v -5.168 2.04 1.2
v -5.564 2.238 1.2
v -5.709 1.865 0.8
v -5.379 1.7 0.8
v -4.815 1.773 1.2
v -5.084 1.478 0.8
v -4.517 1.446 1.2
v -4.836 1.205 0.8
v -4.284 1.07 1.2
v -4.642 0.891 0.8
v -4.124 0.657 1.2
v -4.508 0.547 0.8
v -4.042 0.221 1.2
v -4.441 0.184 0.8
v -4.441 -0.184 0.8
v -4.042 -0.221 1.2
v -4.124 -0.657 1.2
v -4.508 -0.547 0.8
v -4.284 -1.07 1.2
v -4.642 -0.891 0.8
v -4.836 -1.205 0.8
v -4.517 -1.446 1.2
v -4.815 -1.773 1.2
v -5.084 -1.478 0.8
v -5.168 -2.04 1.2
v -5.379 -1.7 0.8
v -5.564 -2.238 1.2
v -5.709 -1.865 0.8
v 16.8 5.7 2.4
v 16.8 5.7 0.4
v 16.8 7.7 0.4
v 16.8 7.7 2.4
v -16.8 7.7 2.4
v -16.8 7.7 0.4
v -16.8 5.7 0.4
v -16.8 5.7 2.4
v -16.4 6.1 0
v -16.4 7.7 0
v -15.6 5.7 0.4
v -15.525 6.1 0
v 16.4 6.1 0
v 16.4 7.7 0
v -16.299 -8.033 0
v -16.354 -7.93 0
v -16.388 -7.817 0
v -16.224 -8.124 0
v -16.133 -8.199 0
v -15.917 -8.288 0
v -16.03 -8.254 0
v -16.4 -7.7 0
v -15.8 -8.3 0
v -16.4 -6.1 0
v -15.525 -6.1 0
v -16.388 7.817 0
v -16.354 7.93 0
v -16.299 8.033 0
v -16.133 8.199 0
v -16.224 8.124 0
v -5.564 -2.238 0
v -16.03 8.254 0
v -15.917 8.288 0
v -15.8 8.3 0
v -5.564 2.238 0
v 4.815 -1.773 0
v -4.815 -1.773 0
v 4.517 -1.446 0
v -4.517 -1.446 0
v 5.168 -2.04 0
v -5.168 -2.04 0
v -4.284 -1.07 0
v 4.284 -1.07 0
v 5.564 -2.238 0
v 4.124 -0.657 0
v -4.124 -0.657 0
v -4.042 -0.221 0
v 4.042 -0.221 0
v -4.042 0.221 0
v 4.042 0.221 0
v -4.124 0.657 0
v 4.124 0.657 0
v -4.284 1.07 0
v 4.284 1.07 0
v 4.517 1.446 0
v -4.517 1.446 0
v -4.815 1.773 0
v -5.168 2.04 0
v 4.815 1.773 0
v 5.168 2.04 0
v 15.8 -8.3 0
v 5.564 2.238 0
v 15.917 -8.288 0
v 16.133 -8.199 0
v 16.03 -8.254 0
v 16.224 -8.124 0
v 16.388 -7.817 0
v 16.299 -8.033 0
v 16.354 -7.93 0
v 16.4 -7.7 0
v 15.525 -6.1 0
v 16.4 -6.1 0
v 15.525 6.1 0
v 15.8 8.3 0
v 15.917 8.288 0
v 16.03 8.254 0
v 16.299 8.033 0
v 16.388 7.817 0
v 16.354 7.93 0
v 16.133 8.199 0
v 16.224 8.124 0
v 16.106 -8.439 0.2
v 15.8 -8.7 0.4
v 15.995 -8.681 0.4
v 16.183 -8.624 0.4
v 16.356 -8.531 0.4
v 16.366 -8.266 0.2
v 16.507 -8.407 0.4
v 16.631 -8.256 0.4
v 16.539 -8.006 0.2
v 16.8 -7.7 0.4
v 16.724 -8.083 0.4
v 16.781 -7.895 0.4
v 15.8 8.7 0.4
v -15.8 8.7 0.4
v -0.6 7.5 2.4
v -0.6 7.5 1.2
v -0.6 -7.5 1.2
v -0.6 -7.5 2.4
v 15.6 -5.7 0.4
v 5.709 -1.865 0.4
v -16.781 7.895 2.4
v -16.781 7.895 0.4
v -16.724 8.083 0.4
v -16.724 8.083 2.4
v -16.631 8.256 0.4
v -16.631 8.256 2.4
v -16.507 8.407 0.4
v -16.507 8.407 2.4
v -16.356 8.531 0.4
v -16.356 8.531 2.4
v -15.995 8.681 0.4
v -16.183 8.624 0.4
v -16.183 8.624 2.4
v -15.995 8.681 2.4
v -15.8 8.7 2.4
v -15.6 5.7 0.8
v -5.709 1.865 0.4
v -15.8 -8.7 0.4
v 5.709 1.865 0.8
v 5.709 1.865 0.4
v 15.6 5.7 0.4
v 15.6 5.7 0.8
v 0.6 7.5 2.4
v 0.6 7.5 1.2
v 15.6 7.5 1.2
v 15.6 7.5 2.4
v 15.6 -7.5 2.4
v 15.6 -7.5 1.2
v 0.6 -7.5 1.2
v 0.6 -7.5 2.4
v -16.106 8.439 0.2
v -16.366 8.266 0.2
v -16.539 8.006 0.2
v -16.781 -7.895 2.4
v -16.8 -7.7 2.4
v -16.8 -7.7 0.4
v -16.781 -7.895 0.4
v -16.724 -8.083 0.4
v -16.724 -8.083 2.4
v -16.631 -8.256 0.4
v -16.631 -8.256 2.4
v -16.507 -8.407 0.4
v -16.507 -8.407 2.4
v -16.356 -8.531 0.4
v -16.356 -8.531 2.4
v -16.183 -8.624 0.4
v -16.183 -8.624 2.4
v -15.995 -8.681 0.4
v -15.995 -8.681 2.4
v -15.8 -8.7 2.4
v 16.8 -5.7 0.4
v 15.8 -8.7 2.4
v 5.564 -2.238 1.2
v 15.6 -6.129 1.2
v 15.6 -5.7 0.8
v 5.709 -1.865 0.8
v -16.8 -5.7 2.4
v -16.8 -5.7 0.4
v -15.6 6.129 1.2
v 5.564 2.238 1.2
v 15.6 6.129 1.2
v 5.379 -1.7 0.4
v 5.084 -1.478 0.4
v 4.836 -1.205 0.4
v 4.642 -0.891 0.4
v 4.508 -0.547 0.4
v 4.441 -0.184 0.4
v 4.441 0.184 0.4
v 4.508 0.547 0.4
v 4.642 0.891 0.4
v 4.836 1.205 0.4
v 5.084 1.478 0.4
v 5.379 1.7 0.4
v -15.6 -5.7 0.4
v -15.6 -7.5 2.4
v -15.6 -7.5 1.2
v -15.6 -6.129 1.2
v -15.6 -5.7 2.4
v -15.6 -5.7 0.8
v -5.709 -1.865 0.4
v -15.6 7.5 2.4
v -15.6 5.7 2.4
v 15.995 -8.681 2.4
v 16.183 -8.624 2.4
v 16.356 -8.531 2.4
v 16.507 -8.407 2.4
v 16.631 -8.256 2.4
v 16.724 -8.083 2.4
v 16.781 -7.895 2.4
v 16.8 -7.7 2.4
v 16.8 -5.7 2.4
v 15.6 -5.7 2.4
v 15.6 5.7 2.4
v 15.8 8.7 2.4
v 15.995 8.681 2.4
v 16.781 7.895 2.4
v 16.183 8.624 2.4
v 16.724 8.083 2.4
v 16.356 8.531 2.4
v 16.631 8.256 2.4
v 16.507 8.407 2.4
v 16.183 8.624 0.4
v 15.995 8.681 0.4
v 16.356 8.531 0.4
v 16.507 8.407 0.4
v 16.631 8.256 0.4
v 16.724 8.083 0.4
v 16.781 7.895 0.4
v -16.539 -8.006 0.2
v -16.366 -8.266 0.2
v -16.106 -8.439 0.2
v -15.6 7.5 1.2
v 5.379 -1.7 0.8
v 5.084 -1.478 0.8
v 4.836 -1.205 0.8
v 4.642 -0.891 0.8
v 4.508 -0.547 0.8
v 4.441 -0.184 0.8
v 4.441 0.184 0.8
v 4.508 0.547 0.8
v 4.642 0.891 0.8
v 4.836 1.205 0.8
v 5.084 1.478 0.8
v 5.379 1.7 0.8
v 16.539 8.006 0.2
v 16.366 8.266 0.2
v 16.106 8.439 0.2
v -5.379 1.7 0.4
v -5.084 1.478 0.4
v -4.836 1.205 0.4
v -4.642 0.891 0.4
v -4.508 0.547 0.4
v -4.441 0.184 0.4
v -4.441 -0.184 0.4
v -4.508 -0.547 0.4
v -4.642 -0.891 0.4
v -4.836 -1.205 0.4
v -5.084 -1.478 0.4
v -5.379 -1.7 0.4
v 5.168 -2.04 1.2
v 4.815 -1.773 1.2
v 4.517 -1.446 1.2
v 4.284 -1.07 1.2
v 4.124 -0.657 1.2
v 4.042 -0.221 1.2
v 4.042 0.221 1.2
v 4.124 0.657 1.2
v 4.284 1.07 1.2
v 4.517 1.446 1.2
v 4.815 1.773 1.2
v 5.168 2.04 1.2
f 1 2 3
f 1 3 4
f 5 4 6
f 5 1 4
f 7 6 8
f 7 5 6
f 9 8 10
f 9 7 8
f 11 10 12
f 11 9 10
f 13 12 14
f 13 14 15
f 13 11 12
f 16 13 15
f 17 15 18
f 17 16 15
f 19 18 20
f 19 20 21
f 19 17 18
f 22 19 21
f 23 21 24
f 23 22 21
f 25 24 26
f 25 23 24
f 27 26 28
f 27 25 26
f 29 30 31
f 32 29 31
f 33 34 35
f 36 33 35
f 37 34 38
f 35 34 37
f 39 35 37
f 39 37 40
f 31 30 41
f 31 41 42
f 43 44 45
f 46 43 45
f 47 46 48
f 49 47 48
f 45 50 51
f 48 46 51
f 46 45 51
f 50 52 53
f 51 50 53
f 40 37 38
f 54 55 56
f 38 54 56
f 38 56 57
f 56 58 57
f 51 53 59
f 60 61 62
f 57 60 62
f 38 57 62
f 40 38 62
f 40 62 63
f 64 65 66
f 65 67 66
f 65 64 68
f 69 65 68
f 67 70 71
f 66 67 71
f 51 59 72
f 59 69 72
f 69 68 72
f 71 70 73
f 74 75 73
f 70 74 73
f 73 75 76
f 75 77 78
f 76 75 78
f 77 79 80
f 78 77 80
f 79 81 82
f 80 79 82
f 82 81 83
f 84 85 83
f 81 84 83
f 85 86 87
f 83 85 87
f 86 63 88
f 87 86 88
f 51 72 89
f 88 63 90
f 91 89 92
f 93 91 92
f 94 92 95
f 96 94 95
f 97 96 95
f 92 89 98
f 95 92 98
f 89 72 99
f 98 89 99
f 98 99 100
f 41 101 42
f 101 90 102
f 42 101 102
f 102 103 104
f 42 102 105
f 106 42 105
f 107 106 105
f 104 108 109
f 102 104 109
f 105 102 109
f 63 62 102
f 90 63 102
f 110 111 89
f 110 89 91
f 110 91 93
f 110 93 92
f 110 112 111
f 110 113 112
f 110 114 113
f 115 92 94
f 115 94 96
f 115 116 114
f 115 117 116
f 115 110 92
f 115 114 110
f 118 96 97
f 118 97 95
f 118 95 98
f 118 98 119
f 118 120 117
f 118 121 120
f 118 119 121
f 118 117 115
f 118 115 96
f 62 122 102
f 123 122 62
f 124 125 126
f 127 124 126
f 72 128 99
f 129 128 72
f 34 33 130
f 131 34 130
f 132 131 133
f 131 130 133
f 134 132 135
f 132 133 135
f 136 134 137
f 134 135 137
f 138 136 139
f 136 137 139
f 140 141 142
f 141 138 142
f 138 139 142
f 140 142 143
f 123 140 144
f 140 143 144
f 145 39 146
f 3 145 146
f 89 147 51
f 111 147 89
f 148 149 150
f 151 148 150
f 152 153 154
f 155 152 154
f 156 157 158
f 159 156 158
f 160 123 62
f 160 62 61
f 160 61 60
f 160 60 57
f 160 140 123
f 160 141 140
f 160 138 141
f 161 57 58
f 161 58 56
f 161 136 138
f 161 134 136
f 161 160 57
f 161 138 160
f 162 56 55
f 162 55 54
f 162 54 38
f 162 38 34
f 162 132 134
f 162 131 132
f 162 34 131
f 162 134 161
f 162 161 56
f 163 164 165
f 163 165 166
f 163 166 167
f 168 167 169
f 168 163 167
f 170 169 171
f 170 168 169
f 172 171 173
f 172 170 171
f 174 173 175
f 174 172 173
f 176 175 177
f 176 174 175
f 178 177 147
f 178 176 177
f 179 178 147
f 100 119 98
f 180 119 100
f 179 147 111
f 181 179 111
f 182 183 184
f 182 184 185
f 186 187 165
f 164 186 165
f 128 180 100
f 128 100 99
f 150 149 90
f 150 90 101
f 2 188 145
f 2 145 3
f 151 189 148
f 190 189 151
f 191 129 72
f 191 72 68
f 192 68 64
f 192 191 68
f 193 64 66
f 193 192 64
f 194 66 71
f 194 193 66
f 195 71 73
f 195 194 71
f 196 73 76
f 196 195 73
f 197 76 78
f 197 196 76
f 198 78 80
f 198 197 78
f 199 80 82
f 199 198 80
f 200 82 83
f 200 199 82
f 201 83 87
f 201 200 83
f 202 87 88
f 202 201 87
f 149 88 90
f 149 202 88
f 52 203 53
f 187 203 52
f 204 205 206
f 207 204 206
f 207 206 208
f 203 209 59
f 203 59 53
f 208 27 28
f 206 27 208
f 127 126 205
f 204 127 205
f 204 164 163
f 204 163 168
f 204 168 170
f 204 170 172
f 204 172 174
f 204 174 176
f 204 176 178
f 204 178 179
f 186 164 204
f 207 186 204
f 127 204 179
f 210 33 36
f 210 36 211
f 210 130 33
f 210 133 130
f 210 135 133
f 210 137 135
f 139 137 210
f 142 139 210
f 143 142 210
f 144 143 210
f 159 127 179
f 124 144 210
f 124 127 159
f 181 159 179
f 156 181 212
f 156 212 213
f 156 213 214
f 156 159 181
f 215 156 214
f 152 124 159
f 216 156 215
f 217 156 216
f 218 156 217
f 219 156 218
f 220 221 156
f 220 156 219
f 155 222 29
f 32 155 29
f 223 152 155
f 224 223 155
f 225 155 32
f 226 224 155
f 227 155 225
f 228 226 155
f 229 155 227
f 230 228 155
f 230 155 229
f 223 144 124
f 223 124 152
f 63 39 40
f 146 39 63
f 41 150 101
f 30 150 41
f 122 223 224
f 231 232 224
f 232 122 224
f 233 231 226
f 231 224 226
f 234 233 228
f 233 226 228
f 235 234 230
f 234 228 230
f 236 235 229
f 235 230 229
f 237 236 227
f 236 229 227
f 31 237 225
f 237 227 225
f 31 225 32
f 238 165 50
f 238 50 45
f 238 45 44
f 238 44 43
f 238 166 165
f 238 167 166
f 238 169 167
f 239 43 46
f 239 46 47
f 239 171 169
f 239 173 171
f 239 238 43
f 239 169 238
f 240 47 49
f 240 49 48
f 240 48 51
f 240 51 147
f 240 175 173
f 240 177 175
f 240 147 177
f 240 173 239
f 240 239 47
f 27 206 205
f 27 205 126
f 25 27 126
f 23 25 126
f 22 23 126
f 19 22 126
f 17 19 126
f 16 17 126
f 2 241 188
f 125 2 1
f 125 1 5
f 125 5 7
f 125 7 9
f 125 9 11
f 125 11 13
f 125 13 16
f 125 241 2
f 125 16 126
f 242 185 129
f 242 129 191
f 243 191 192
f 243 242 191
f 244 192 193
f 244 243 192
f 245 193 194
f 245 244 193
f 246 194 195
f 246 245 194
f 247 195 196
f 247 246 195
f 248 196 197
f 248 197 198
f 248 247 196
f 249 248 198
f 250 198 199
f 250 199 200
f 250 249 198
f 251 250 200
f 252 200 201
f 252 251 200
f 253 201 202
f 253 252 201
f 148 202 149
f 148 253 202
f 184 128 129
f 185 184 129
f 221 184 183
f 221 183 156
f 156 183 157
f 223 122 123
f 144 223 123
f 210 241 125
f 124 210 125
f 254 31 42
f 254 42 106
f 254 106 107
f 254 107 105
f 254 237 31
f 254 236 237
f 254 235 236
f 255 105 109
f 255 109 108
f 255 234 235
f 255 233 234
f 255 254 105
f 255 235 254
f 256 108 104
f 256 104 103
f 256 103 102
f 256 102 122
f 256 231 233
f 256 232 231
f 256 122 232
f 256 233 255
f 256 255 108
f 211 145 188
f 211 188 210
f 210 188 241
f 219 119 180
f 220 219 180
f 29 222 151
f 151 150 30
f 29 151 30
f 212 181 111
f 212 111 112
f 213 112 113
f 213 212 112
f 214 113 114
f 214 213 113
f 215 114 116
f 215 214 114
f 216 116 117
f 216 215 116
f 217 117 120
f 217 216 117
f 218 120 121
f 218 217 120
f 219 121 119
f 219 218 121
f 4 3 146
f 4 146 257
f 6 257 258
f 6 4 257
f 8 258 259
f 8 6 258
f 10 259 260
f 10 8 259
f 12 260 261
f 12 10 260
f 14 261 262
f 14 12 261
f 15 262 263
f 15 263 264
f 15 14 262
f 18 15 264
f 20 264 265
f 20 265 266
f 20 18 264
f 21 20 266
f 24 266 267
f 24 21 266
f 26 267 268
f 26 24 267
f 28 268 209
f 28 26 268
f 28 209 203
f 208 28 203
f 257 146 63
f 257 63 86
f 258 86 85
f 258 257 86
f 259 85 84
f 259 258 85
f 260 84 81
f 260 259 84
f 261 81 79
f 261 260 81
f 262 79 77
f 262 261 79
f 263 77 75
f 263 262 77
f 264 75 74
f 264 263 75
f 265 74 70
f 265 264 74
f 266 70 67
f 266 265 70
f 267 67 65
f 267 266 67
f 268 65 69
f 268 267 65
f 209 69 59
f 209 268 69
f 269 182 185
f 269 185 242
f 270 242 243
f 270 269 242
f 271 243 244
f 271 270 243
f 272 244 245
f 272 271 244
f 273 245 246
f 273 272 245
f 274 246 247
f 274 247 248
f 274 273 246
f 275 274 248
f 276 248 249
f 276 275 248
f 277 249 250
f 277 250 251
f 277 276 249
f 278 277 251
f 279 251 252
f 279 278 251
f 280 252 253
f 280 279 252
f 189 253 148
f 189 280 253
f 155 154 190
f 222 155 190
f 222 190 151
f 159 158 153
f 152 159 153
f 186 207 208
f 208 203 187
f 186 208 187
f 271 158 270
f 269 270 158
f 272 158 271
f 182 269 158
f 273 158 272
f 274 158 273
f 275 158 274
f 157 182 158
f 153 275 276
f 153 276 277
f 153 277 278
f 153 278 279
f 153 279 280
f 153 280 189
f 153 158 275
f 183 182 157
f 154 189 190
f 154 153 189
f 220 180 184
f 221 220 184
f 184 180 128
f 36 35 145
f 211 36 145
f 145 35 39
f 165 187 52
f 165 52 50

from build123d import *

# Parameters (mm, degrees)
F2_DEPTH = 1.2
F3_DEPTH = 2.4
F4_R     = 2
F5_R     = 1
F6_SIZE  = 0.4


with BuildPart() as f2:
    # F1 (on Top) → F2 (new body)
    with BuildSketch(Plane.XY):
        Polygon((-15.6, 7.5), (-15.6, 5.7), (-0.9, 0), (-15.6, -5.7), (-15.6, -7.5), (-0.6, -7.5), (-0.6, 0), (-0.6, 7.5), align=None)
    extrude(amount=F2_DEPTH)



with BuildPart() as f2b:
    # F1 (on Top) → F2, piece 2 (new body)
    with BuildSketch(Plane.XY):
        Polygon((0.9, 0), (15.6, 5.7), (15.6, 7.5), (0.6, 7.5), (0.6, 0), (0.6, -7.5), (15.6, -7.5), (15.6, -5.7), align=None)
    extrude(amount=F2_DEPTH)


with BuildPart() as f2_1:
    add(f2.part)

    add(f2b.part)  # F3 merges F2b
    # F1 (on Top) → F3 (join)
    with BuildSketch(Plane.XY):
        Polygon((0, 8.7), (-16.8, 8.7), (-16.8, 5.7), (-15.6, 5.7), (-15.6, 7.5), (-0.6, 7.5), (-0.6, 0), (-0.6, -7.5), (-15.6, -7.5), (-15.6, -5.7), (-16.8, -5.7), (-16.8, -8.7), (0, -8.7), (16.8, -8.7), (16.8, -5.7), (15.6, -5.7), (15.6, -7.5), (0.6, -7.5), (0.6, 0), (0.6, 7.5), (15.6, 7.5), (15.6, 5.7), (16.8, 5.7), (16.8, 8.7), align=None)
    extrude(amount=F3_DEPTH)

    # F4
    f4_edges = [f2_1.edges().sort_by_distance(p)[0] for p in [
        (-0.9, 0, 0.6),
        (0.9, 0, 0.6),
    ]]
    fillet(f4_edges, radius=F4_R)

    # F5
    f5_edges = [f2_1.edges().sort_by_distance(p)[0] for p in [
        (16.8, -8.7, 1.2),
        (16.8, 8.7, 1.2),
        (-16.8, -8.7, 1.2),
        (-16.8, 8.7, 1.2),
    ]]
    fillet(f5_edges, radius=F5_R)

    # F6
    f6_edges = [f2_1.edges().sort_by_distance(p)[0] for p in [
        (16.8, 6.7, 0),
        (16.507107, 8.407107, 0),
        (16.2, 5.7, 0),
        (0, 8.7, 0),
        (10.654511, 3.782361, 0),
        (-16.507107, 8.407107, 0),
        (4.432077, 0, 0),
        (-16.8, 6.7, 0),
        (10.654511, -3.782361, 0),
        (-16.2, 5.7, 0),
        (16.2, -5.7, 0),
        (-10.654511, 3.782361, 0),
        (16.8, -6.7, 0),
        (-4.432077, 0, 0),
        (16.507107, -8.407107, 0),
        (-10.654511, -3.782361, 0),
        (0, -8.7, 0),
        (-16.2, -5.7, 0),
        (-16.507107, -8.407107, 0),
        (-16.8, -6.7, 0),
        (-10.654511, -3.782361, 1.2),
        (4.432077, 0, 1.2),
    ]]
    chamfer(f6_edges, length=F6_SIZE)


solid = f2_1.part
